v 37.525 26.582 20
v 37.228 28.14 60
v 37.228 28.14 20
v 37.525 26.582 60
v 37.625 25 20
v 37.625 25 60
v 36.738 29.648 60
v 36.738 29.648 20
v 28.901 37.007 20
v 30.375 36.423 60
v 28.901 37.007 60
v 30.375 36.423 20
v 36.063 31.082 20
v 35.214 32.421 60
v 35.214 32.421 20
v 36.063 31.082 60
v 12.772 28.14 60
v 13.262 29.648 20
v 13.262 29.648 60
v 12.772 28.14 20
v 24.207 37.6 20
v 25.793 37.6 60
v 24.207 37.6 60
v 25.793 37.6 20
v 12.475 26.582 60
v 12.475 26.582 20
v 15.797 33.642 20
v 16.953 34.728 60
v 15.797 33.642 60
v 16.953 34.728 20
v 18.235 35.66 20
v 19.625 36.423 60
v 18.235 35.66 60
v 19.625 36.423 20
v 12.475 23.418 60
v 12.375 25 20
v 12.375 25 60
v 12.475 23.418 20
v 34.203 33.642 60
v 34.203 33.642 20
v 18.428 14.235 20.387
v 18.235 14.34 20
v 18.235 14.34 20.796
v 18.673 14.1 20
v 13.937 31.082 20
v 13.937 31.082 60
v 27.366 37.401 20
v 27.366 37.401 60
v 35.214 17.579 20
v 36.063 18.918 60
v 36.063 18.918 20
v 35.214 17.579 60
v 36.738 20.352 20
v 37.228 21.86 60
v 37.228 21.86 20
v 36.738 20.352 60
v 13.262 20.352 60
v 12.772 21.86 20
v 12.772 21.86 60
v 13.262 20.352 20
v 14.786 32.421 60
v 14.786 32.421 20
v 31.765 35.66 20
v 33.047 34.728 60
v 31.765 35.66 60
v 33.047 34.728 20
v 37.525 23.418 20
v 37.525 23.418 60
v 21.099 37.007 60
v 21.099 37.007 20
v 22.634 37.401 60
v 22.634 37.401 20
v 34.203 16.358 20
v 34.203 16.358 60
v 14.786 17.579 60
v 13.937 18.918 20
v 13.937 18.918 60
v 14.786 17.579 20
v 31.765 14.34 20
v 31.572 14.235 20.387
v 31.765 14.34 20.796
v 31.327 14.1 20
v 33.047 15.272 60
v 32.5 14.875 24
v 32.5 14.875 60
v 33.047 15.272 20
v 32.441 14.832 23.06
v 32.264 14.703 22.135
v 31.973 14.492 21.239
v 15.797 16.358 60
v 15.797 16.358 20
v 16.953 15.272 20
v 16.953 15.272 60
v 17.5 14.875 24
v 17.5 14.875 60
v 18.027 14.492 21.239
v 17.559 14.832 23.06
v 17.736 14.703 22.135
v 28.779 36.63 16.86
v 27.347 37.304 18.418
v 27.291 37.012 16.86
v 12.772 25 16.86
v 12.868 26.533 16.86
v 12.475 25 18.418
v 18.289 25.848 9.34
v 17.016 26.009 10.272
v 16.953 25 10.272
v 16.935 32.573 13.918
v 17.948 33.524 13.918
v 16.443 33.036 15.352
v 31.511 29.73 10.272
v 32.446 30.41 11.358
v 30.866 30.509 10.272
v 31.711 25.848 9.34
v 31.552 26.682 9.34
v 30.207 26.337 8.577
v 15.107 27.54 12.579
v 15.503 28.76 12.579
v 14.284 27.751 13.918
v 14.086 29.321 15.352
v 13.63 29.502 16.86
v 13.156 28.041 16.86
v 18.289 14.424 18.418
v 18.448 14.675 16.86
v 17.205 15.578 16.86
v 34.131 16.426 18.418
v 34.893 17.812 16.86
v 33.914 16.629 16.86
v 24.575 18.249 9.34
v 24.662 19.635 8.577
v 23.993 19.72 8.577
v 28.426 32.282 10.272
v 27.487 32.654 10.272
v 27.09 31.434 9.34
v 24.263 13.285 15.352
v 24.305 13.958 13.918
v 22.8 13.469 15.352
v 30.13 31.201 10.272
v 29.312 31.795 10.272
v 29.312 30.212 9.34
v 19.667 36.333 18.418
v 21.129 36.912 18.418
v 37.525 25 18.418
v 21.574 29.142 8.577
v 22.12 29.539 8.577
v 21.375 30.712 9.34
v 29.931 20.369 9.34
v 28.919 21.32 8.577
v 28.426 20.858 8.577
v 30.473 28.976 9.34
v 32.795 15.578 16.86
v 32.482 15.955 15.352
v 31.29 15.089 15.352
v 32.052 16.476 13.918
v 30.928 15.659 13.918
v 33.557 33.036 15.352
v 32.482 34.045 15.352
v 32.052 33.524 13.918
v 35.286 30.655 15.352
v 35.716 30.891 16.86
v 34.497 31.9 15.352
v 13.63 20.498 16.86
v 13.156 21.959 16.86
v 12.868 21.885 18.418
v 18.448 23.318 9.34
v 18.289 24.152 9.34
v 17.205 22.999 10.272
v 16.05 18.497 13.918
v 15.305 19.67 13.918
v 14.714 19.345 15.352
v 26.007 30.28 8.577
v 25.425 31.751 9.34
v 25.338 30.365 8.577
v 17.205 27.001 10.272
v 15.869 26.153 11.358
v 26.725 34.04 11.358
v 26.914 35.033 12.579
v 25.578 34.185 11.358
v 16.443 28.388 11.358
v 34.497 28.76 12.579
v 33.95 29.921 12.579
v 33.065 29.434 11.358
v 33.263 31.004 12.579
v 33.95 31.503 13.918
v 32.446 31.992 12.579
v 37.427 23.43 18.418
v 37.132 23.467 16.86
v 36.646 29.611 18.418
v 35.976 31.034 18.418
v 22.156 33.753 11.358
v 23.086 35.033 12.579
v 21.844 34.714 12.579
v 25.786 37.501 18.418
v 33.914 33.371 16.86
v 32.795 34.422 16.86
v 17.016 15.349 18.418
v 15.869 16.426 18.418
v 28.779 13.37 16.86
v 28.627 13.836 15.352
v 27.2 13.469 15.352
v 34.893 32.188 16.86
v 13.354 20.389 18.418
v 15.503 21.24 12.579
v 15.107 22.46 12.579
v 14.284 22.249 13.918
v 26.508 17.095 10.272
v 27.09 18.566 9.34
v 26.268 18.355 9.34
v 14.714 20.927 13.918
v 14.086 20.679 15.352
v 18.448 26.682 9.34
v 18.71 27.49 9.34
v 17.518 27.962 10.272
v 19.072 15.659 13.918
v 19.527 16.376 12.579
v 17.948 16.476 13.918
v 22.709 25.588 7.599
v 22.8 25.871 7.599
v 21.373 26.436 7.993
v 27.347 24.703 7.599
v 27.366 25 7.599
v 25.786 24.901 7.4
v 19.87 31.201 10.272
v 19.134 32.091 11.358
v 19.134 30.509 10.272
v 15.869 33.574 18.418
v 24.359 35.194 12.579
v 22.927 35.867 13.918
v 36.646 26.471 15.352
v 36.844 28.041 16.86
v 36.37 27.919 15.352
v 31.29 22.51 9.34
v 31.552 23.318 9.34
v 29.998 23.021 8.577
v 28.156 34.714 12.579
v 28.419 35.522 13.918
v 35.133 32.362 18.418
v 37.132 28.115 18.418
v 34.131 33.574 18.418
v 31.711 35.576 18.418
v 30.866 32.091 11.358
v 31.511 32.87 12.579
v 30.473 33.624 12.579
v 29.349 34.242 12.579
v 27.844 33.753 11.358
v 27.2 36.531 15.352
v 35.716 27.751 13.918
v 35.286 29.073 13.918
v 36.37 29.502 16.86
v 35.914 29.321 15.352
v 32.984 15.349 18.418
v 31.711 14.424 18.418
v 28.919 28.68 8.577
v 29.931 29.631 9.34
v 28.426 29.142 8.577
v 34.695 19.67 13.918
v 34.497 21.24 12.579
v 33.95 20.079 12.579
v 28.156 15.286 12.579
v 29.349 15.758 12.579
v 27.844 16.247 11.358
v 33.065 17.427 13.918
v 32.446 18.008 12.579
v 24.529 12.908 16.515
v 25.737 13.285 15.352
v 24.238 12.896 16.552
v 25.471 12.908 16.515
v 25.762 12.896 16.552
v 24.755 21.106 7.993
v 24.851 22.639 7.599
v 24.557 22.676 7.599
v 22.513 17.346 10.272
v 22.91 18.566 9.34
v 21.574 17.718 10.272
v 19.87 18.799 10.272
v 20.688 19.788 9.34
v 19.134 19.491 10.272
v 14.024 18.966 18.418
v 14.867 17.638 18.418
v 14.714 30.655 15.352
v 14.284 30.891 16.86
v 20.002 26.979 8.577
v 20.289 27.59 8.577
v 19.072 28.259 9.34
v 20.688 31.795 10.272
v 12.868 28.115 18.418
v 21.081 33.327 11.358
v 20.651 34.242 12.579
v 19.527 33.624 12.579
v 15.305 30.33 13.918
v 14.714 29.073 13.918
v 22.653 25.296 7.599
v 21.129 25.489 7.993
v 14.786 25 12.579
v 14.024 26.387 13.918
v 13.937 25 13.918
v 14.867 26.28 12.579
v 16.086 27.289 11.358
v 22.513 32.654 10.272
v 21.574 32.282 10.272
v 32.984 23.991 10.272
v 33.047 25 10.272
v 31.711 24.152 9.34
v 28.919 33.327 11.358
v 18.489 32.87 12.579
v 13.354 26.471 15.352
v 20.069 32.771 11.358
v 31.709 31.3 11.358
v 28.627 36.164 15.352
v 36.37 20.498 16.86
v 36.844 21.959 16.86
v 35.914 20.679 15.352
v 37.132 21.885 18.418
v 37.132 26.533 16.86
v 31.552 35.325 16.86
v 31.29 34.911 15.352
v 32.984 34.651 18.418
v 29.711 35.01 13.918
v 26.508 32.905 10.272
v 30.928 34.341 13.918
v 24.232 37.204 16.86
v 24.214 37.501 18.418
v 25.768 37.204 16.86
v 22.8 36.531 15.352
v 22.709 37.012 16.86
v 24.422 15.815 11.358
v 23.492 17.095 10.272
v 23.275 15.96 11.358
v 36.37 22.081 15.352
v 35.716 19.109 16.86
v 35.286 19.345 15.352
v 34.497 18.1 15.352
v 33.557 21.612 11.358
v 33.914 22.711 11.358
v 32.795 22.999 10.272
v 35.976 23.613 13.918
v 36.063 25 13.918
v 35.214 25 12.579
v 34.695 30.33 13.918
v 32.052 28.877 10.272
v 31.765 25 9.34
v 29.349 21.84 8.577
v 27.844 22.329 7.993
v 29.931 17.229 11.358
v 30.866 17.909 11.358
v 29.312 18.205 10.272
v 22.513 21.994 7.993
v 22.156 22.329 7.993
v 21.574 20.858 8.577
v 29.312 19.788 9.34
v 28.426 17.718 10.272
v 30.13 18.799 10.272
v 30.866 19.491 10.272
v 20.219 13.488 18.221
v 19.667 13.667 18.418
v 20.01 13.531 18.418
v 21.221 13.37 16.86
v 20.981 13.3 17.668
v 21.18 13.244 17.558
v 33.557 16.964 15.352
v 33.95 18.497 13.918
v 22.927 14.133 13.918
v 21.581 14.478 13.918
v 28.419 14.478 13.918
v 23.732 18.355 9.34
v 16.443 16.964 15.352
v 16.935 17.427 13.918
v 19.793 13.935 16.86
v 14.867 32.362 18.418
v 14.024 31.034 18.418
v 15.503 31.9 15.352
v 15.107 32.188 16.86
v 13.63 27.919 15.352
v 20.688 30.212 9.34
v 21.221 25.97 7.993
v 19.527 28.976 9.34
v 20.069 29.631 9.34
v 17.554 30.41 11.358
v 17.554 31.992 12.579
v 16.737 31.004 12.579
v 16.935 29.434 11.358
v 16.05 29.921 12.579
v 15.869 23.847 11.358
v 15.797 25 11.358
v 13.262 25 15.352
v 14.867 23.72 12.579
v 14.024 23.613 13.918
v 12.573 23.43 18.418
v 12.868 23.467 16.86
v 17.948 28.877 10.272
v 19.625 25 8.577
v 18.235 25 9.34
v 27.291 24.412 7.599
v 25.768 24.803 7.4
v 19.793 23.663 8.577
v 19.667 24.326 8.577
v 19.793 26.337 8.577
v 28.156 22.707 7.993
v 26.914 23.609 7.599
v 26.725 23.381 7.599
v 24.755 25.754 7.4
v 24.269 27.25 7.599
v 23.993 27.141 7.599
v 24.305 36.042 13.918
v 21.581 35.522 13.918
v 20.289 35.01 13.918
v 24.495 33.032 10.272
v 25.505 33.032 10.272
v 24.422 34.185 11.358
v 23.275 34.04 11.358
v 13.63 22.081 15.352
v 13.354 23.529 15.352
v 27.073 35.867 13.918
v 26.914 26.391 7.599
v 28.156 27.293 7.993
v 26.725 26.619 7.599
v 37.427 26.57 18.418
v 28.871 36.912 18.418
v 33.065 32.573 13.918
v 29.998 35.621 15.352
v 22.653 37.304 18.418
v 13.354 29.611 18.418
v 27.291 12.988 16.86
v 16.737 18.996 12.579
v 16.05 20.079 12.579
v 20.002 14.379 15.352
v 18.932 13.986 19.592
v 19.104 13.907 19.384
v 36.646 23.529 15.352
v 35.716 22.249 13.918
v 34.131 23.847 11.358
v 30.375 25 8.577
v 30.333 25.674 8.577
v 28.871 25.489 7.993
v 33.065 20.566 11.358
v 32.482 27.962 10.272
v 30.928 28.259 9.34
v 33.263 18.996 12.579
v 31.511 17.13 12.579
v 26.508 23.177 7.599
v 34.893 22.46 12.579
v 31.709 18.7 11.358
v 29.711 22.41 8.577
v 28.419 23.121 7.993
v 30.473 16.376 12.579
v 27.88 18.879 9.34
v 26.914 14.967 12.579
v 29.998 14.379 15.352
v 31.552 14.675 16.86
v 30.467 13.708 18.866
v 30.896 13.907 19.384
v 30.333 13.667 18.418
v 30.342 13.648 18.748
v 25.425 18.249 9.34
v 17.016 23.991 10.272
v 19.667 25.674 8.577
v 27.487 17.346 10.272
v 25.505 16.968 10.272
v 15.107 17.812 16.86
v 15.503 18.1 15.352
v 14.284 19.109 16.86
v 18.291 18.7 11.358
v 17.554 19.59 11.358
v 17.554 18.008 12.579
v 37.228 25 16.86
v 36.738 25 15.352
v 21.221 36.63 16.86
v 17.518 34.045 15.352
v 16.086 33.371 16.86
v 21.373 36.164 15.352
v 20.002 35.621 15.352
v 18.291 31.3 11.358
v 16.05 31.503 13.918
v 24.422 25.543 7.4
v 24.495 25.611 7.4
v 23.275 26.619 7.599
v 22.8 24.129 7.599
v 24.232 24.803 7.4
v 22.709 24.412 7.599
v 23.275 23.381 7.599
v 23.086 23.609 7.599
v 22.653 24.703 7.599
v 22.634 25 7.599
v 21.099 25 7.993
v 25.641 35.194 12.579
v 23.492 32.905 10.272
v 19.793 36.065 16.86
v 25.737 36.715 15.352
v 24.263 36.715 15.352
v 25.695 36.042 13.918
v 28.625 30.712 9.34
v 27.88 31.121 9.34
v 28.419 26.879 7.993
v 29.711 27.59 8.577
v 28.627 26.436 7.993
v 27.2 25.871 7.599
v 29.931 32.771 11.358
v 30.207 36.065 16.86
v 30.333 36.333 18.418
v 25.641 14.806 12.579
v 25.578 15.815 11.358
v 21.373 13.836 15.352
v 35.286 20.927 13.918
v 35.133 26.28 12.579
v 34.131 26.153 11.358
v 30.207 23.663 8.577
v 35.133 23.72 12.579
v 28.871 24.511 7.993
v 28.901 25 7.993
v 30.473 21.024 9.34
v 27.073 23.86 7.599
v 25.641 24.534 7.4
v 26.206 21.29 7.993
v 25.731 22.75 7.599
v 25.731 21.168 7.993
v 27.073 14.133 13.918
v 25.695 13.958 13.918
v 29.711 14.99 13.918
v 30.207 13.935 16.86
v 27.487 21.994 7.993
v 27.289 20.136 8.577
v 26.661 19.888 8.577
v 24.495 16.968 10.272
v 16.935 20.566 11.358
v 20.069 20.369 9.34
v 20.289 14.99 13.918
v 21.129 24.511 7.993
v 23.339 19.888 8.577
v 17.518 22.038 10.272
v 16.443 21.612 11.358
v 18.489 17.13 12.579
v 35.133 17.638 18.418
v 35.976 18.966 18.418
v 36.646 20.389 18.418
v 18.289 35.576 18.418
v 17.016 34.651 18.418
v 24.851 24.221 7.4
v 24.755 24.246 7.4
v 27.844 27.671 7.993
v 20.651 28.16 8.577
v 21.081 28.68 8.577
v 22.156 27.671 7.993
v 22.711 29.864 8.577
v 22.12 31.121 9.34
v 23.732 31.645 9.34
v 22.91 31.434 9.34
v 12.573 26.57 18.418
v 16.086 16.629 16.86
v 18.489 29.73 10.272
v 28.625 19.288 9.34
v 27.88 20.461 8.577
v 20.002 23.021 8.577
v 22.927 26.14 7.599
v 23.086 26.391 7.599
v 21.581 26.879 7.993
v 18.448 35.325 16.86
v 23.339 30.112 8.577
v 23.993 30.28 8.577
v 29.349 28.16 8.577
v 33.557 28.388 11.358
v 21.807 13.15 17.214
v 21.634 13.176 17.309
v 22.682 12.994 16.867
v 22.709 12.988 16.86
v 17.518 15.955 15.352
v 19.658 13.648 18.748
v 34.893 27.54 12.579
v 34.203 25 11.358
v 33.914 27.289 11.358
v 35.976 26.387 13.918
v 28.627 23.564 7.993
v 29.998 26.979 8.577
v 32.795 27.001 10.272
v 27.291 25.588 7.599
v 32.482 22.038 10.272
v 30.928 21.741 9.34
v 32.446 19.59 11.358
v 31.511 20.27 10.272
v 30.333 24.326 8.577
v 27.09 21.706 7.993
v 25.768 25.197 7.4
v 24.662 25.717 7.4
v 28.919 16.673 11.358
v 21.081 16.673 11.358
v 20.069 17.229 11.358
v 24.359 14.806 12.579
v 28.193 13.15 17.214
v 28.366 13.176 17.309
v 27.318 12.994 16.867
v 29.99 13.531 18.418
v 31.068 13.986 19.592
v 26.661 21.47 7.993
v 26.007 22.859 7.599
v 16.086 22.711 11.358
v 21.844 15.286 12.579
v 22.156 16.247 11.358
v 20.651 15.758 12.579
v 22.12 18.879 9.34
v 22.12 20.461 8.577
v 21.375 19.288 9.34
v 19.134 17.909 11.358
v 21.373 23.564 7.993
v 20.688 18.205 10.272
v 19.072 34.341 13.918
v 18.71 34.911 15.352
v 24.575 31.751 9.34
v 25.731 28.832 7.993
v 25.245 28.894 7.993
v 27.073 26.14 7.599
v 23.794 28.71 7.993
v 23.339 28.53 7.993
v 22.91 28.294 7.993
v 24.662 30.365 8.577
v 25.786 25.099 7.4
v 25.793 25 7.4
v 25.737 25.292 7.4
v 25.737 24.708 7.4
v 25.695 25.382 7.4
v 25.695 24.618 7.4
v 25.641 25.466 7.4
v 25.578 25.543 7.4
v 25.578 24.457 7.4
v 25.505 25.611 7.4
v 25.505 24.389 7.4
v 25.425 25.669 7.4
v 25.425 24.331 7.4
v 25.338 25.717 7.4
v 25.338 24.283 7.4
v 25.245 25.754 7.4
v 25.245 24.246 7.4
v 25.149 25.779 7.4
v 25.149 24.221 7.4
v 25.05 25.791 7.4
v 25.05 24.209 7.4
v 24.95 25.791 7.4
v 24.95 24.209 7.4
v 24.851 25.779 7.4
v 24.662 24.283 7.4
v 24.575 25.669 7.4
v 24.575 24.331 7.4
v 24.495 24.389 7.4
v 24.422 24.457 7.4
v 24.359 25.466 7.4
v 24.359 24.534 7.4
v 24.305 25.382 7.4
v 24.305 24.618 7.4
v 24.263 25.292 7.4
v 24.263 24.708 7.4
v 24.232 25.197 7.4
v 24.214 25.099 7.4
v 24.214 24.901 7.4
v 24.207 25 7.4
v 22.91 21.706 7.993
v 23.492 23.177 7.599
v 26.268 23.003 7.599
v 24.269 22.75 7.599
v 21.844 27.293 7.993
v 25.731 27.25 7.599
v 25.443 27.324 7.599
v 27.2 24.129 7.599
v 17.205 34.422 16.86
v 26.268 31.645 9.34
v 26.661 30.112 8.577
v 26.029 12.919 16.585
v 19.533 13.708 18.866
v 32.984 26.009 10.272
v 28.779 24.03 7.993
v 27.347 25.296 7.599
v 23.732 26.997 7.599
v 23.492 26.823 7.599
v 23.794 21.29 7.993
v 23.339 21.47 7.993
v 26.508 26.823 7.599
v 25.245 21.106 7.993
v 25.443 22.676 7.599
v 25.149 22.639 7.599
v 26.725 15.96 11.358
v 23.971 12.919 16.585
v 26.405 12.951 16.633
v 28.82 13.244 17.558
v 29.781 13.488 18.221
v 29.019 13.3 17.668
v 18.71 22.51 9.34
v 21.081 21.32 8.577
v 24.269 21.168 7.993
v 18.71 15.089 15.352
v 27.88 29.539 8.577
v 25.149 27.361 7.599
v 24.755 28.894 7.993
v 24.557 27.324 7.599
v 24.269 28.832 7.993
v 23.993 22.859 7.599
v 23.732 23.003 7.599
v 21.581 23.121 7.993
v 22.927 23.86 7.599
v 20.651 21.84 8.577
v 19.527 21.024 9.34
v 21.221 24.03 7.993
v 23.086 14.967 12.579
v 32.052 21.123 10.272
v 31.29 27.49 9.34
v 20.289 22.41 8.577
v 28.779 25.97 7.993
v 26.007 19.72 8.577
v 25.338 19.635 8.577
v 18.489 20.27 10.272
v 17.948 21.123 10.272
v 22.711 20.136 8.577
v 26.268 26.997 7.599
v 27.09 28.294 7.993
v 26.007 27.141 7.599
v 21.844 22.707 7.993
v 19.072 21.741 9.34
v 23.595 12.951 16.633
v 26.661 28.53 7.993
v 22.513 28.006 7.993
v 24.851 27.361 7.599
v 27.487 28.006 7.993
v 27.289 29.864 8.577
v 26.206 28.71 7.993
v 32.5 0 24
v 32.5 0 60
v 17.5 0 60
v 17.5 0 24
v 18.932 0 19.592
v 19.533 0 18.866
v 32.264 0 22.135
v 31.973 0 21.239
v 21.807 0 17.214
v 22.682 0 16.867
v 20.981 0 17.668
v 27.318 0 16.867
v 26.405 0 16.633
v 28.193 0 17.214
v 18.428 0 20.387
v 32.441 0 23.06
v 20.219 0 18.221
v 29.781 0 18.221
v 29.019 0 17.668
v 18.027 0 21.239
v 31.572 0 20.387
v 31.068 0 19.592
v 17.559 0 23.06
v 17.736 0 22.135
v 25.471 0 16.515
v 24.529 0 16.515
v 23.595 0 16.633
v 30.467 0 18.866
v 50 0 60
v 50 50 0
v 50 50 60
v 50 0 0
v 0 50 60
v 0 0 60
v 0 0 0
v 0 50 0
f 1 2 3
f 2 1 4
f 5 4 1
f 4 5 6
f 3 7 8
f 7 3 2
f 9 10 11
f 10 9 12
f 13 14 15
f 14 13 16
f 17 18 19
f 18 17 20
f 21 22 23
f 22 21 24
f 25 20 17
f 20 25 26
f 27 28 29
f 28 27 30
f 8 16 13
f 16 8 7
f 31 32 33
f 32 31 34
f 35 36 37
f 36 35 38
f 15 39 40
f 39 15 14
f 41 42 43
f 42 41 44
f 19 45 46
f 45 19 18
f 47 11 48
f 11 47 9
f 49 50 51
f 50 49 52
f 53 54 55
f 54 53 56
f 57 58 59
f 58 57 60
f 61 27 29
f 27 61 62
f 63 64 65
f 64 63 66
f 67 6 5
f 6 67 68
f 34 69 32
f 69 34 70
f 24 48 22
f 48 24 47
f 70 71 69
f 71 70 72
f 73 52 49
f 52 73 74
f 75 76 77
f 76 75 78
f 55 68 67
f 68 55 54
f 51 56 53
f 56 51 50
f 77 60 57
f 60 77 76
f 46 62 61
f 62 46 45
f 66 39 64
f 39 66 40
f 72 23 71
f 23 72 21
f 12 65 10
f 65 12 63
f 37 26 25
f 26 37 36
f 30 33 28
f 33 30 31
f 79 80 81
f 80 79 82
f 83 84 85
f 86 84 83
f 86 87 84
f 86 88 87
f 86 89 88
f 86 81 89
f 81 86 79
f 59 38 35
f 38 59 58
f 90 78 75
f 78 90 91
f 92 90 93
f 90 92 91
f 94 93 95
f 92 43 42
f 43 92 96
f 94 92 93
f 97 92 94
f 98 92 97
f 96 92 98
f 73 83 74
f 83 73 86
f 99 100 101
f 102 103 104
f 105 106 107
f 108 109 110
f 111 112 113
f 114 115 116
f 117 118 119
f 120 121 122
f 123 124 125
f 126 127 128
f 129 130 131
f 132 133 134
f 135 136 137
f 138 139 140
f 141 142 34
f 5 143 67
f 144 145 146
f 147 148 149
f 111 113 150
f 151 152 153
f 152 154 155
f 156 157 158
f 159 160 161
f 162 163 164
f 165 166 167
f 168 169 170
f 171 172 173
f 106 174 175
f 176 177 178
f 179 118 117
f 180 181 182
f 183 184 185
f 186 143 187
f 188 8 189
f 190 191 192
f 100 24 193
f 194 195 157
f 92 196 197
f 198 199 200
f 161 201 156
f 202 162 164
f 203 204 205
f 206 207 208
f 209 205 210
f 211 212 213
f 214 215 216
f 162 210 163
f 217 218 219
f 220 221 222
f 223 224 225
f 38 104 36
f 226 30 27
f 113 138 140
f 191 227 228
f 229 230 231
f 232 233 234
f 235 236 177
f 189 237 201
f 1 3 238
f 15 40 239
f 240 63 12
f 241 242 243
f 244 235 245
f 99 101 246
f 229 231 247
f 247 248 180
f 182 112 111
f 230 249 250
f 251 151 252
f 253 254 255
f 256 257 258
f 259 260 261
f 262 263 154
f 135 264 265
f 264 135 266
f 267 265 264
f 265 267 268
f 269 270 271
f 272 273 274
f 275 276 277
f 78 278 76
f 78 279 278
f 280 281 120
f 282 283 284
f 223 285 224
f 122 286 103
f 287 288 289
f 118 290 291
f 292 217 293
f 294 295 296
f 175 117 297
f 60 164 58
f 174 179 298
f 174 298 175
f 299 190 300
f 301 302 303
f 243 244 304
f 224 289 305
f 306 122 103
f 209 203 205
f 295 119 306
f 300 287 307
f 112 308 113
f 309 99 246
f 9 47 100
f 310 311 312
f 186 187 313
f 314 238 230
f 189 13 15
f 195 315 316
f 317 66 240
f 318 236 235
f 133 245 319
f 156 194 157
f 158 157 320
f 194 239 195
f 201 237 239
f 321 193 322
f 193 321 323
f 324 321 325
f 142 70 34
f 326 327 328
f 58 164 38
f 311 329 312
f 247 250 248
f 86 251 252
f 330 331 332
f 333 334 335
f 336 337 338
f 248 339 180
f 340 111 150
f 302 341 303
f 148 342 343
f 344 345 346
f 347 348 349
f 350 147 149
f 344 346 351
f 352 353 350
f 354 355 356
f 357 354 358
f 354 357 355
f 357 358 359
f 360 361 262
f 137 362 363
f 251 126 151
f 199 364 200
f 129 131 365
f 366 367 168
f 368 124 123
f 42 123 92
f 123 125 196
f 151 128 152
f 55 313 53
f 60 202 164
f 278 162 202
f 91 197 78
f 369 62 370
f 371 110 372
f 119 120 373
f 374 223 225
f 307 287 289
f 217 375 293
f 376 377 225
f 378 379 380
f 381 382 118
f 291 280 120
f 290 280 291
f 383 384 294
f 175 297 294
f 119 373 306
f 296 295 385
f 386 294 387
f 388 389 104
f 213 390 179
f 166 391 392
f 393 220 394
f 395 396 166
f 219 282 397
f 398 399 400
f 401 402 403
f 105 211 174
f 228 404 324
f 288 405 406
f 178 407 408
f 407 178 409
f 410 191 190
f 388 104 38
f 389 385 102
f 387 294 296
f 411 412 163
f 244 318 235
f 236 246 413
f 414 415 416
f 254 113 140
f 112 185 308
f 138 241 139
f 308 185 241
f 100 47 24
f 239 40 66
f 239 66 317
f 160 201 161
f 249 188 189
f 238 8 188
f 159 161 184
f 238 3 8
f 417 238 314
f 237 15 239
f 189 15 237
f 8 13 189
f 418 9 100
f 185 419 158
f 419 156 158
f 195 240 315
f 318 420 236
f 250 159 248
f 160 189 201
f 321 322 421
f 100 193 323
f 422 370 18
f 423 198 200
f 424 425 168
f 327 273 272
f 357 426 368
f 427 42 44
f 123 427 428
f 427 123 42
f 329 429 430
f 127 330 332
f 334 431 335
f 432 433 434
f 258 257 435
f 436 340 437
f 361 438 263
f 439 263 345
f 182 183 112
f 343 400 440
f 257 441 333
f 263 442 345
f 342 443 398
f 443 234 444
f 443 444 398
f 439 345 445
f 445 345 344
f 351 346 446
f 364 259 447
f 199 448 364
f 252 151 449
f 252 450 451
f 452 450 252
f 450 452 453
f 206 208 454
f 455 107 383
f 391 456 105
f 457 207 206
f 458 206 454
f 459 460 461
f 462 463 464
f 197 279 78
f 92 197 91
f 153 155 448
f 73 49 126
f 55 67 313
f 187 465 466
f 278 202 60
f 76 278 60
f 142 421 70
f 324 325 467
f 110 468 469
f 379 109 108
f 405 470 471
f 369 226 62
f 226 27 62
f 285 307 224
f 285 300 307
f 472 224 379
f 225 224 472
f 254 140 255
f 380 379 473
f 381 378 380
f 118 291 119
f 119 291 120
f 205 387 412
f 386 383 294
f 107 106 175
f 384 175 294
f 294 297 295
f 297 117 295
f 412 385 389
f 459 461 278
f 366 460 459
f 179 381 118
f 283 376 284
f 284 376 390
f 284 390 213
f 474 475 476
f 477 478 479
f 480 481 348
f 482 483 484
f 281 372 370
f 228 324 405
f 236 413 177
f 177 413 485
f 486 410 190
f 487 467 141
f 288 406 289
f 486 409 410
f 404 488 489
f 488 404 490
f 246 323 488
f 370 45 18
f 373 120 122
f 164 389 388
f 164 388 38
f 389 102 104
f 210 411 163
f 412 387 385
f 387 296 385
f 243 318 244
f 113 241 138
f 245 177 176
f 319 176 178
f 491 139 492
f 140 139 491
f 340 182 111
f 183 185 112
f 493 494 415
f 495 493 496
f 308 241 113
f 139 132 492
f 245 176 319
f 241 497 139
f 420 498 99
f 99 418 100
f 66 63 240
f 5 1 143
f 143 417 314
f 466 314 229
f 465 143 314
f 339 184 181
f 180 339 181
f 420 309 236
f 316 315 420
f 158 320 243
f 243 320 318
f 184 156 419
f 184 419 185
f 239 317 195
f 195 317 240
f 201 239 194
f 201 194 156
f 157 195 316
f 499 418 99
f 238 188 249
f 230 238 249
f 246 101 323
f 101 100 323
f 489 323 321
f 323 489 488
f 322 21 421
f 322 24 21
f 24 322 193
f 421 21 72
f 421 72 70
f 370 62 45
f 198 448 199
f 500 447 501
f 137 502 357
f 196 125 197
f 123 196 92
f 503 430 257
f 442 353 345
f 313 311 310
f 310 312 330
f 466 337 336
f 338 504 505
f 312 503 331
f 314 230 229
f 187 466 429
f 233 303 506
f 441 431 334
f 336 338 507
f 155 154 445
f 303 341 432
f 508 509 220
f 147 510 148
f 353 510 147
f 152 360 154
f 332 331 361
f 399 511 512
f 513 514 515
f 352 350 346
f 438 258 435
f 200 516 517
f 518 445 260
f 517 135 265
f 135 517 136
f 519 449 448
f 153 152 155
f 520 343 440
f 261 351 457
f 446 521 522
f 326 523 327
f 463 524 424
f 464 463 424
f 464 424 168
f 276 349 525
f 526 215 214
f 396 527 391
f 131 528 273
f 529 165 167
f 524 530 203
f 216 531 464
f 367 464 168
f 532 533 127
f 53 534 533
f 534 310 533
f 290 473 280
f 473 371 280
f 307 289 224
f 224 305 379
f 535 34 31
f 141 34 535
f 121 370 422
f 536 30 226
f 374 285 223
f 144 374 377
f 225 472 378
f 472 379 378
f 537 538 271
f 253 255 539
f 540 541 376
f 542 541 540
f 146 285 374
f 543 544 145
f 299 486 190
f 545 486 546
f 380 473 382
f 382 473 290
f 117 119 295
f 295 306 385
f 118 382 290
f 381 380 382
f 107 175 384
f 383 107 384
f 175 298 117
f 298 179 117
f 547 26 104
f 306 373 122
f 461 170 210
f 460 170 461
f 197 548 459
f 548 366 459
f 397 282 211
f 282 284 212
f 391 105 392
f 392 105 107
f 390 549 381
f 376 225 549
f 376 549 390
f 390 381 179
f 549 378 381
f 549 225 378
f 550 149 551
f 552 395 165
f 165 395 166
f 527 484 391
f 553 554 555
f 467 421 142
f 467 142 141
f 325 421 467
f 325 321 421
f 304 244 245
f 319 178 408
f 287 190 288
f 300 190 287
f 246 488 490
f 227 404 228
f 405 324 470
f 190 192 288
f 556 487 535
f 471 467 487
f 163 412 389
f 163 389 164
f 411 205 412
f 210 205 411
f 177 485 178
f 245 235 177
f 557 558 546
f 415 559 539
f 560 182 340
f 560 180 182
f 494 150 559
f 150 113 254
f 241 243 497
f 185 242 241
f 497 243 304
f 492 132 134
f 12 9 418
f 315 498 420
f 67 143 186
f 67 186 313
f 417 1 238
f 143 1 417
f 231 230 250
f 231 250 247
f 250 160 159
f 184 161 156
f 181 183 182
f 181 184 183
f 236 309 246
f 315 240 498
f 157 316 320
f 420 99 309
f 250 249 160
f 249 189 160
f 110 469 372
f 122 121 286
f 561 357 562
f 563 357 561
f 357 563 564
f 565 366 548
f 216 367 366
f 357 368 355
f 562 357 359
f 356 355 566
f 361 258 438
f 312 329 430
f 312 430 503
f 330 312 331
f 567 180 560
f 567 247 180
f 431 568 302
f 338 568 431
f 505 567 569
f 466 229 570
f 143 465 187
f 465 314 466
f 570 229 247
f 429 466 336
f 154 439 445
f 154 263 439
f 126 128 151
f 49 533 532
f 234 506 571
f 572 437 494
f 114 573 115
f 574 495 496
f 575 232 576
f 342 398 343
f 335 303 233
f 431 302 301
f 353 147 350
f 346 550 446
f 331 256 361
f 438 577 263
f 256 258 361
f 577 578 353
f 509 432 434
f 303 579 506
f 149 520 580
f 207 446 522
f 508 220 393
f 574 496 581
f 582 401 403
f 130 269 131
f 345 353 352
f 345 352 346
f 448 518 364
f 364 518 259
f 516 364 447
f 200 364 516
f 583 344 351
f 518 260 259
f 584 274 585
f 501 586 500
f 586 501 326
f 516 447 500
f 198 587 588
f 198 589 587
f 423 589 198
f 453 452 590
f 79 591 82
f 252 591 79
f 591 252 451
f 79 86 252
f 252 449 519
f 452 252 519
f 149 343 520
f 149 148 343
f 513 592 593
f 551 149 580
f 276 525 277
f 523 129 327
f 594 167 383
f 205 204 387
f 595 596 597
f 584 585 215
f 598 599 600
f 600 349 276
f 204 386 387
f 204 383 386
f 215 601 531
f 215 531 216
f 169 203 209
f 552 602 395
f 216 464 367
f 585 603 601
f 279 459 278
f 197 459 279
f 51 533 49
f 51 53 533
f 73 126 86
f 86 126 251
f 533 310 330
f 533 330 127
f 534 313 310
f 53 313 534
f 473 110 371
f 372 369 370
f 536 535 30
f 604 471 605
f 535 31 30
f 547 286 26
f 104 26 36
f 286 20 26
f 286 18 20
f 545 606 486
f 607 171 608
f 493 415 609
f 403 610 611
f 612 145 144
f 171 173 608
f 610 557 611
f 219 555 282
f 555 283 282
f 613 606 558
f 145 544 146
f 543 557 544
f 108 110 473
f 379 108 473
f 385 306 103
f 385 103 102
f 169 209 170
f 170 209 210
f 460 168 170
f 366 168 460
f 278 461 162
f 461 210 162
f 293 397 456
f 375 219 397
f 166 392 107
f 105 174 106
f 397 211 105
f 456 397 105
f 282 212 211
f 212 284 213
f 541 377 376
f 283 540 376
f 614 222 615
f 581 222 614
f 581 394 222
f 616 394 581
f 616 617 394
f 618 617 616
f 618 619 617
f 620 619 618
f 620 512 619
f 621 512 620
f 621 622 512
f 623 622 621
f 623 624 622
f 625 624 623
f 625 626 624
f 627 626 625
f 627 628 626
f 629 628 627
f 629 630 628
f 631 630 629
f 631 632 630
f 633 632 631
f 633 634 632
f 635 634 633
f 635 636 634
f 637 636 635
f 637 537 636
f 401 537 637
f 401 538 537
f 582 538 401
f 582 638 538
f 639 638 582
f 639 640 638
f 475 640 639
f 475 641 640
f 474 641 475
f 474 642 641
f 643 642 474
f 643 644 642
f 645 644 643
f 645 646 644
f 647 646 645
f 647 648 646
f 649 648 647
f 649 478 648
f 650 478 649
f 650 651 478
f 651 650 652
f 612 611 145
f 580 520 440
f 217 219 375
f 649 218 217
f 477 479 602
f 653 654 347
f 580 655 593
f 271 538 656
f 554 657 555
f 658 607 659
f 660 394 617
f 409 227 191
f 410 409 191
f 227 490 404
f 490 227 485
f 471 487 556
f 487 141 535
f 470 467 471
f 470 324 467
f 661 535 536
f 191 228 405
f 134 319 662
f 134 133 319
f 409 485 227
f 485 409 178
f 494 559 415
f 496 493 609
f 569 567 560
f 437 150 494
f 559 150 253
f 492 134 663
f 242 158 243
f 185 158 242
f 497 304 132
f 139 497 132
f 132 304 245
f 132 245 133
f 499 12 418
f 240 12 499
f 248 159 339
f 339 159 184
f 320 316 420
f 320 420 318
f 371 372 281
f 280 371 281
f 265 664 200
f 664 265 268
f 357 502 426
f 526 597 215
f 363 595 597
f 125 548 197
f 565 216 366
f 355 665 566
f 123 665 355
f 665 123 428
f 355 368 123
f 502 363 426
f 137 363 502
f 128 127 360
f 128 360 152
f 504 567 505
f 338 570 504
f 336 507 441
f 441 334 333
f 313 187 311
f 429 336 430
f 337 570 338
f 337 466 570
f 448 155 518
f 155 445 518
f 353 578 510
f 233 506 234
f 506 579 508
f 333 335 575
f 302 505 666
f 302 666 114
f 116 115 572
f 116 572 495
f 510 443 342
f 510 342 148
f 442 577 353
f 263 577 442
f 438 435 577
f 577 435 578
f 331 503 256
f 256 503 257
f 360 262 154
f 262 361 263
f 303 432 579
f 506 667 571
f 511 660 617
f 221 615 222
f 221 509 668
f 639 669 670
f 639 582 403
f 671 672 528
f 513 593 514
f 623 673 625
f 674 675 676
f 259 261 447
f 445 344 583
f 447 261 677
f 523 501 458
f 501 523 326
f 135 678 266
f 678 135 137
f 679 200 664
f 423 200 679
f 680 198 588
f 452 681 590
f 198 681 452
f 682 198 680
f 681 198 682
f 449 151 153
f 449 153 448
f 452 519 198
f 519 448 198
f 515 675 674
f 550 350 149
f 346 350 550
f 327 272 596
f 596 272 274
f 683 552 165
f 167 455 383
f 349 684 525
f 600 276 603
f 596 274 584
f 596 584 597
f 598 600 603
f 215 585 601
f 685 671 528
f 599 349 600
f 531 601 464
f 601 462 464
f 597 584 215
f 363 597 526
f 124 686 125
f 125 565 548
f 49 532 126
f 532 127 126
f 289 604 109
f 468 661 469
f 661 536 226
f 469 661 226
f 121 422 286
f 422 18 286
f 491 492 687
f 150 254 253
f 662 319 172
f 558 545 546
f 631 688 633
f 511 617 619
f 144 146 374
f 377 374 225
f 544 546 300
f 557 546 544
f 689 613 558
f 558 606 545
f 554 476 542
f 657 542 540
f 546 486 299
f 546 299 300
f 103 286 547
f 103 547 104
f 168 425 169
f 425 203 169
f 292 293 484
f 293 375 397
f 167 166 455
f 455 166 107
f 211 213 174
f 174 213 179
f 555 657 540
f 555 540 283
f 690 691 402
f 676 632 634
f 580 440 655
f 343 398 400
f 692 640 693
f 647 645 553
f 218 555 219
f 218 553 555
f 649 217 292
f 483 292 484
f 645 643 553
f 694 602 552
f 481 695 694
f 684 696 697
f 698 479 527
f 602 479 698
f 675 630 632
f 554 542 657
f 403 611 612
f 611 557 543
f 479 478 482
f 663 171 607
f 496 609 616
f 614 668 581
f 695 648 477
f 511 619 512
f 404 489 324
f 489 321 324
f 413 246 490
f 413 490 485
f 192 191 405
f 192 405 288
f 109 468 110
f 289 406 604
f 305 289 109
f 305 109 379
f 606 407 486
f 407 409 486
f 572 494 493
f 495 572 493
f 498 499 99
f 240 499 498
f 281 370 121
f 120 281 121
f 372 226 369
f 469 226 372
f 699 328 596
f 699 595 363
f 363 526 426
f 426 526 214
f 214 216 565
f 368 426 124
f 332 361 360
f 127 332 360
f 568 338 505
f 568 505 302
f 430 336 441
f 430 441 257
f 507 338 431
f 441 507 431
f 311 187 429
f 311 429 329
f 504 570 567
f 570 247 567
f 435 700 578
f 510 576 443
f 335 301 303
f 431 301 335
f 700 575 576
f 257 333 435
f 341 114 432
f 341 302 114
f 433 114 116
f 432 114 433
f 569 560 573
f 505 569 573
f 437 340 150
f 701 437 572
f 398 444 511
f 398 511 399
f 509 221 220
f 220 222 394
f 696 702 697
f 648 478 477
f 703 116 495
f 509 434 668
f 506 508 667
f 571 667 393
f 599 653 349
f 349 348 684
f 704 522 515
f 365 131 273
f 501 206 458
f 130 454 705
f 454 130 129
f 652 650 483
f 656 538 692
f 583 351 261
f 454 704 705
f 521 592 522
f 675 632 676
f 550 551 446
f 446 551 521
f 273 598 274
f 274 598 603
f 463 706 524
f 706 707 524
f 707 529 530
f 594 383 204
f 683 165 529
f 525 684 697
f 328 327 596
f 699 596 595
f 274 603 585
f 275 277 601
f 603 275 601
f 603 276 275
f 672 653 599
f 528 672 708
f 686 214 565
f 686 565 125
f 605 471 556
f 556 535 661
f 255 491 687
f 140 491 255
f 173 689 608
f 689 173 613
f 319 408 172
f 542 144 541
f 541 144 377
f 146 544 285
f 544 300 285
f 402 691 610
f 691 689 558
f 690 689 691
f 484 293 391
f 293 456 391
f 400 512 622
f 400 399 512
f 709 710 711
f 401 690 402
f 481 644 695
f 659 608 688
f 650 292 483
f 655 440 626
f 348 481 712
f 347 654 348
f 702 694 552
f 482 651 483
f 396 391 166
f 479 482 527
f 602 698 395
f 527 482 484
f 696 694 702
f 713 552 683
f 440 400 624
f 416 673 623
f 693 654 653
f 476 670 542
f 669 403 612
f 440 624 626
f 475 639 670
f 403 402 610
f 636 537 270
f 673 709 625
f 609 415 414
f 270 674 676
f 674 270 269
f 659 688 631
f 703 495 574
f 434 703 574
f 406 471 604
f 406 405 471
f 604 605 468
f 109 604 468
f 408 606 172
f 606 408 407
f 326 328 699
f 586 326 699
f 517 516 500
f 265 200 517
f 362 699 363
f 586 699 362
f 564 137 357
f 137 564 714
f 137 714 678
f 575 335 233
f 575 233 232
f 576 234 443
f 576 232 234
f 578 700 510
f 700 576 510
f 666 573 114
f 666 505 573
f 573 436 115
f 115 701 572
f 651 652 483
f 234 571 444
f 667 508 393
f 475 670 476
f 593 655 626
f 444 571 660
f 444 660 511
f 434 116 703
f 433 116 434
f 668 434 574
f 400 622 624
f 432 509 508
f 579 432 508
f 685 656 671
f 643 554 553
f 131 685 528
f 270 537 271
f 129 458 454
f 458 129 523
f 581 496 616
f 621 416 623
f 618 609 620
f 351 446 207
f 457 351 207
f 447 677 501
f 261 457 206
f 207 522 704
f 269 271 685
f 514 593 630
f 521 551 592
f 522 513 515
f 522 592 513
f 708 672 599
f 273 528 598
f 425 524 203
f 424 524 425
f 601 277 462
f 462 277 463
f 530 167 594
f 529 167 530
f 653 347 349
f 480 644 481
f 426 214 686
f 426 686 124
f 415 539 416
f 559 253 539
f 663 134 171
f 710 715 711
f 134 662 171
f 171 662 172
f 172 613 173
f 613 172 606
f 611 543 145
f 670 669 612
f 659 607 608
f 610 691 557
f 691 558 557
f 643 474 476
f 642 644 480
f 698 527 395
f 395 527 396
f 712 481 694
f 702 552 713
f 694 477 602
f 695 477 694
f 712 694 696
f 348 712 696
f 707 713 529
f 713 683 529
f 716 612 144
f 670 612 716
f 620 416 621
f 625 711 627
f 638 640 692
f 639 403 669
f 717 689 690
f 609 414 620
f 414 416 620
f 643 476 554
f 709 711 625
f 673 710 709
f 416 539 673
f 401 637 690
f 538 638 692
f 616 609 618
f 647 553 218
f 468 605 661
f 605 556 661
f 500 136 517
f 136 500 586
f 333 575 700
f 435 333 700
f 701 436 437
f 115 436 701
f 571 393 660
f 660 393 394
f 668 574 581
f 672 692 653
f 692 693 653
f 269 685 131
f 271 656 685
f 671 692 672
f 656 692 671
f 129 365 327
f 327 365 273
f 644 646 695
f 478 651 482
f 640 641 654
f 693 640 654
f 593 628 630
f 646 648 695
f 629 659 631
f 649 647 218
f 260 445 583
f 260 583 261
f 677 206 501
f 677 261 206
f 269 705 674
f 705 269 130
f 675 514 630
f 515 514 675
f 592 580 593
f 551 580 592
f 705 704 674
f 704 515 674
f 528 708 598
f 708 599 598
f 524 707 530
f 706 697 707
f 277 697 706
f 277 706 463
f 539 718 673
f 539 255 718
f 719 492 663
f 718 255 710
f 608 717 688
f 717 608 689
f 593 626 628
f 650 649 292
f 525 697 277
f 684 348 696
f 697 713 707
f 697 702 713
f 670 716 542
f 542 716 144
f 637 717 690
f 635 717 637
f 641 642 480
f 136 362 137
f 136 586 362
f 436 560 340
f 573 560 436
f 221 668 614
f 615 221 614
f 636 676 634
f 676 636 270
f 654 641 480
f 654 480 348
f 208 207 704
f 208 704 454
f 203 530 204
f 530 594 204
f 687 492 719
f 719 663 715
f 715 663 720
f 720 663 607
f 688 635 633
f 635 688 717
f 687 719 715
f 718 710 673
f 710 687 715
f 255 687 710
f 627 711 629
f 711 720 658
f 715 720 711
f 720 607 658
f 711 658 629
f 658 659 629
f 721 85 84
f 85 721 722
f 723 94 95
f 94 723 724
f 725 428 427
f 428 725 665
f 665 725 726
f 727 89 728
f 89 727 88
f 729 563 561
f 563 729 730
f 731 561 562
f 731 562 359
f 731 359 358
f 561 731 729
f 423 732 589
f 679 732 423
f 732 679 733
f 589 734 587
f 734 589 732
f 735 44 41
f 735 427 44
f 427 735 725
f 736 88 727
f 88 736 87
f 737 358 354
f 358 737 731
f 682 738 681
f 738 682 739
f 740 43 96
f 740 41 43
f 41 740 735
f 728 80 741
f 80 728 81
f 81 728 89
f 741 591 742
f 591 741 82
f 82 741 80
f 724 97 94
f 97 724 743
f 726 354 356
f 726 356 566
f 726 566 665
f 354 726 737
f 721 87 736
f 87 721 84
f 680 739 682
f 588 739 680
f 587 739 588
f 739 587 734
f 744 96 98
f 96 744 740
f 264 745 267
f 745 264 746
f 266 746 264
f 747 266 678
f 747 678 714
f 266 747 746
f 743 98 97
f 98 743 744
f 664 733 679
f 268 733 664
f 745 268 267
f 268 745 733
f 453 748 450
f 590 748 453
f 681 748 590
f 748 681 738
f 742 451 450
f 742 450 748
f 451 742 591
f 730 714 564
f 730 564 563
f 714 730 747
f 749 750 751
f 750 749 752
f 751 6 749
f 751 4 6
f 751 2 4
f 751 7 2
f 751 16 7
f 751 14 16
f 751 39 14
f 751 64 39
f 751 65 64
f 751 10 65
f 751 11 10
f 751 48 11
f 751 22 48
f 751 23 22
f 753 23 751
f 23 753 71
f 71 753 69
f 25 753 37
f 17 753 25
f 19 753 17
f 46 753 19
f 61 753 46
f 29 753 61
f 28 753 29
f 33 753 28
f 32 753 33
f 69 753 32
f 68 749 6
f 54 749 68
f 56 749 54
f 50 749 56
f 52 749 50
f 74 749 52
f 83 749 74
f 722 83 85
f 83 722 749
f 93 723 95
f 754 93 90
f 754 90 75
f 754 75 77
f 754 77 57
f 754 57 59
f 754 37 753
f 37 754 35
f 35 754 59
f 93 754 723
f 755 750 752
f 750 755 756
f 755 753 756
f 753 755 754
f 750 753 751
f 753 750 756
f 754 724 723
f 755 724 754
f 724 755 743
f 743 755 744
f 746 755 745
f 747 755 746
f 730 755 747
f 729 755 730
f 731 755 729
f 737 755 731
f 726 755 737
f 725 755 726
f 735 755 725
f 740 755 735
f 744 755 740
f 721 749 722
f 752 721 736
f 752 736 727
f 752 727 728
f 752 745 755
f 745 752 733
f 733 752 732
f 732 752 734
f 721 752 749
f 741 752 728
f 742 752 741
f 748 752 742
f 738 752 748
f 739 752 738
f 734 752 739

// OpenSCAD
//Length of the cube:
laenge=50; // [10:100]
//heigth of the cube:
hoehe=60; // [10:100]
//heigth of the cube:
breite=50; // [10:100]
//diameter of the glass
glas=25; //[10:60]

toleranz=0.25;  
//cut (front):
auschnitt=15; //[8:100]

//miko="N";

//Basis-Rechteck
difference(){
    
//if(miko="N"){
  
cube([laenge,breite,hoehe]);
//}   
//else{    
//$fn=50;
//minkowski()
//{
//  cube([laenge,breite,hoehe]);
//  cylinder(r=2,h=1);
//}
//}
    
    
    
union(){
translate([laenge/2,breite/2,hoehe/3])
cylinder(h = hoehe, d1 = glas+toleranz, d2 = glas+toleranz, $fn=50) ;
translate([laenge/2,breite/2,hoehe/3])
sphere(d = glas+toleranz, $fn=50);

translate([laenge/2-auschnitt/2,-10,hoehe/2.5])
cube([auschnitt,breite/2,hoehe]);


translate([laenge/2,breite/2,hoehe/2.5])
rotate([90,0,0])
cylinder(h = hoehe, d1 = auschnitt, d2 = auschnitt, $fn=50) ;
}
}
